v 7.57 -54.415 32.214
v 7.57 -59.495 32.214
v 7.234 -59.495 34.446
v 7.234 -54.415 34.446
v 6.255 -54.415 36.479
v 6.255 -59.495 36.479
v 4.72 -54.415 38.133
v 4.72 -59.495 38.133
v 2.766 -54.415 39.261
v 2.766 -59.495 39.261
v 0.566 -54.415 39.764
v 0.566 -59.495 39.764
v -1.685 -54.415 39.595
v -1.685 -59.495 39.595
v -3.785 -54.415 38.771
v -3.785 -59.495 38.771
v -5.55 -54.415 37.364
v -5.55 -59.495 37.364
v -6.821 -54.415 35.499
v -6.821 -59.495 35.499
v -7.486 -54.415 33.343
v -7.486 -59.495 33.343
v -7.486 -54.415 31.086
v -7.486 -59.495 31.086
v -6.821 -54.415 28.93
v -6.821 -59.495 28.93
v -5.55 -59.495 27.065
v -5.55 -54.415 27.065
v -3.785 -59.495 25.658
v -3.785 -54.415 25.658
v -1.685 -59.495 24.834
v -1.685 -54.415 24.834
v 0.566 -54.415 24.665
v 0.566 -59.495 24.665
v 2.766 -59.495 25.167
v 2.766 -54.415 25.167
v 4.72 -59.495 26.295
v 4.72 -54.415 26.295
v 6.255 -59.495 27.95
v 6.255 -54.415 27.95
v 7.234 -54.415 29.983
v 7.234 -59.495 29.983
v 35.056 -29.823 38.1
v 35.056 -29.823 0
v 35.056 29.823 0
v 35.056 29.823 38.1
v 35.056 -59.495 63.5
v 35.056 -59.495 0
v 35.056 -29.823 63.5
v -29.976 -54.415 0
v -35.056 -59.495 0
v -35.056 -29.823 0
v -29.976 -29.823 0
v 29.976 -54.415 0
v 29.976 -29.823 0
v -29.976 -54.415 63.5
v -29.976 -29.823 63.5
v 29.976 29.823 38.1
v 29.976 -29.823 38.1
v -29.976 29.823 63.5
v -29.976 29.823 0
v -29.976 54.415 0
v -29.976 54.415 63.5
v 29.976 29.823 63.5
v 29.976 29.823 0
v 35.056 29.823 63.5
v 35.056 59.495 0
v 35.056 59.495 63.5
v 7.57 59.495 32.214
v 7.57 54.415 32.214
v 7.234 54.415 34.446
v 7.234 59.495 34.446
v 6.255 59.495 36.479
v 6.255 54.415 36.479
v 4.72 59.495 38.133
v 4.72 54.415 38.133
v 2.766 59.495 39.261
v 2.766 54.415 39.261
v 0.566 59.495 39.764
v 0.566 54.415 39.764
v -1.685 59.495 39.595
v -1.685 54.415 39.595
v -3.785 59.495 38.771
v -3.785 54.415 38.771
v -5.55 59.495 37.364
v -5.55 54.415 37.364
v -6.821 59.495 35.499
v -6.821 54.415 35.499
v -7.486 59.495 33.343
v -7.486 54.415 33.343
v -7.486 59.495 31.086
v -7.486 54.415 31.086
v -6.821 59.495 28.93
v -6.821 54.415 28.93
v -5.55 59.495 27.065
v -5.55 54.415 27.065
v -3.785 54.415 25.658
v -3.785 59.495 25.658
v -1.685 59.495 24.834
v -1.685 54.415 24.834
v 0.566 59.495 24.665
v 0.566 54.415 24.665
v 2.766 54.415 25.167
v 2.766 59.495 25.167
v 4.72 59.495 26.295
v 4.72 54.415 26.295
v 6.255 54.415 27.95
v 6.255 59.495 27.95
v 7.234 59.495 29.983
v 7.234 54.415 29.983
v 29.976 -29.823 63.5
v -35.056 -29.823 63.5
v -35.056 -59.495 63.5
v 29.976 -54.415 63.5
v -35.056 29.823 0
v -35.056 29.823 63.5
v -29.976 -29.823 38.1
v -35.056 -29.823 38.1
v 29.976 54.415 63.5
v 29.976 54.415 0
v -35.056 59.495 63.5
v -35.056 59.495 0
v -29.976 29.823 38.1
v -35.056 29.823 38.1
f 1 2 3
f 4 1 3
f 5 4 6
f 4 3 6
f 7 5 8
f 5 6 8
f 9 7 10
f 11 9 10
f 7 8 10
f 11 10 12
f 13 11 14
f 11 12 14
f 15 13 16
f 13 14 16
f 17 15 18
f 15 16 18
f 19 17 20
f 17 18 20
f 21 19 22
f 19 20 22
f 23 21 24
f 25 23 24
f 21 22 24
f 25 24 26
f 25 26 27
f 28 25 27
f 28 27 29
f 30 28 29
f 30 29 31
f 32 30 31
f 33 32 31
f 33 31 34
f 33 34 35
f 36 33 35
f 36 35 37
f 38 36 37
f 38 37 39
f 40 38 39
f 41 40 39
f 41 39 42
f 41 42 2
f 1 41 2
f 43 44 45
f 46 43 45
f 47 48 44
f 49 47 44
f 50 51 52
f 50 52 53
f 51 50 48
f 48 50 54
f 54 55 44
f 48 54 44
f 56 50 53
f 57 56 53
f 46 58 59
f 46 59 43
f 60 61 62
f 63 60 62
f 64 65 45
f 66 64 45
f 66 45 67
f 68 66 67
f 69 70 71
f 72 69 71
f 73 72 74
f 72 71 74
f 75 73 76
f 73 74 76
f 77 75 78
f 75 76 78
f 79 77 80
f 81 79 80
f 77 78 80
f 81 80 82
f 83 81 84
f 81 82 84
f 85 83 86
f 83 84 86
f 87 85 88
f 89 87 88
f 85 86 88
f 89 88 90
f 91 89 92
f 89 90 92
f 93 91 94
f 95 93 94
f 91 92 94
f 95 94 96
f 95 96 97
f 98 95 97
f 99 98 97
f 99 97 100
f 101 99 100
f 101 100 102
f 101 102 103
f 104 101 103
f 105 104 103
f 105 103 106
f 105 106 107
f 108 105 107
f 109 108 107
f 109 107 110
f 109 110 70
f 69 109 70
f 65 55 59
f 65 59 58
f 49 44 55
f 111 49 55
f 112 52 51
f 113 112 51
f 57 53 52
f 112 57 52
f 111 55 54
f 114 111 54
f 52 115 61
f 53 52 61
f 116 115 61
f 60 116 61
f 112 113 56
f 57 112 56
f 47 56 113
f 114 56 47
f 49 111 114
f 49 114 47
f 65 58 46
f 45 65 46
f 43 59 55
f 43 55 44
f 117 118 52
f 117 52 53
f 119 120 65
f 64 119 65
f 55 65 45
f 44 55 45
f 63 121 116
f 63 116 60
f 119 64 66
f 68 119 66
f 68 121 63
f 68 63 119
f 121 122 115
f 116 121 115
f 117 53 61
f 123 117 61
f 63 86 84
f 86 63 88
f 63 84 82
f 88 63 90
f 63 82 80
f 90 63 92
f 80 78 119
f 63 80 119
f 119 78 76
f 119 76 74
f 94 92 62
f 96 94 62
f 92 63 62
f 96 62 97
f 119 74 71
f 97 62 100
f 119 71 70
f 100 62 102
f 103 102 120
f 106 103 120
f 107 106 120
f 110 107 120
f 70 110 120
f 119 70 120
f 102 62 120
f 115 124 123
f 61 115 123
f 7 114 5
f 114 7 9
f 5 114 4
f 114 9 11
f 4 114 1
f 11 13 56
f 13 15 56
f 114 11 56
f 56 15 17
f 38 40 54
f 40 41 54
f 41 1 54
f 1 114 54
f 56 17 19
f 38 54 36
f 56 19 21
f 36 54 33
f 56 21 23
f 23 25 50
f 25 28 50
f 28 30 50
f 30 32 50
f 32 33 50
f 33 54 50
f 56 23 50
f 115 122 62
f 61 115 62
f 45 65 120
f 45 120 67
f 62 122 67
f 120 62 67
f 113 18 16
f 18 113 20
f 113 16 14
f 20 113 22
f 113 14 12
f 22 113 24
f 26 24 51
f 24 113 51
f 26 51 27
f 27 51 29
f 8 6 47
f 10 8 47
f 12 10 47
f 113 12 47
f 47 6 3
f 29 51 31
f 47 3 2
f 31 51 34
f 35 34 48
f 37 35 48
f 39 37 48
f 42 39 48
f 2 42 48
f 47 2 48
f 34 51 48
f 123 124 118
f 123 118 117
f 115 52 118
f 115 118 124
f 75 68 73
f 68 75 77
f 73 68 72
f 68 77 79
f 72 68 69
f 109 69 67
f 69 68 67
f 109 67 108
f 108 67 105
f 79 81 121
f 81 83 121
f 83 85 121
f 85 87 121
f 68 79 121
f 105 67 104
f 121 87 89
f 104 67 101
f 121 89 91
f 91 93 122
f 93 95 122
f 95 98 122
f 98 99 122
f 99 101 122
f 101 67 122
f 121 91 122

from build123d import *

# Parameters (mm, degrees)
F1_DEPTH = 63.5
F0_W     = 5.08
F0_H     = 59.645742
F2_DEPTH = 38.1
F3_R     = 7.570452
F4_DEPTH = 124.206


with BuildPart() as f1:
    # F0 (on Top) → F1 (new body)
    with BuildSketch(Plane.XY):
        Polygon((29.976288, 29.822871), (35.056288, 29.822871), (35.056288, 59.494689), (-35.056288, 59.494689), (-35.056288, 29.822871), (-29.976288, 29.822871), (-29.976288, 54.414689), (29.976288, 54.414689), align=None)
        Polygon((-35.056288, -59.494689), (35.056288, -59.494689), (35.056288, -29.822871), (29.976288, -29.822871), (29.976288, -54.414689), (-29.976288, -54.414689), (-29.976288, -29.822871), (-35.056288, -29.822871), align=None)
    extrude(amount=F1_DEPTH)

    # F3 (on face) → F4 (cut)
    with BuildSketch(Plane.XZ.offset(59.494689)):
        with Locations((0, 32.214299)):
            Circle(F3_R)
    extrude(amount=-F4_DEPTH, mode=Mode.SUBTRACT)


with BuildPart() as f2:
    # F0 (on Top) → F2 (new body)
    with BuildSketch(Plane.XY):
        with Locations((-32.516288, 0)):
            Rectangle(F0_W, F0_H)
        with Locations((32.516288, 0)):
            Rectangle(F0_W, F0_H)
    extrude(amount=F2_DEPTH)


solid = Compound([f1.part, f2.part])
